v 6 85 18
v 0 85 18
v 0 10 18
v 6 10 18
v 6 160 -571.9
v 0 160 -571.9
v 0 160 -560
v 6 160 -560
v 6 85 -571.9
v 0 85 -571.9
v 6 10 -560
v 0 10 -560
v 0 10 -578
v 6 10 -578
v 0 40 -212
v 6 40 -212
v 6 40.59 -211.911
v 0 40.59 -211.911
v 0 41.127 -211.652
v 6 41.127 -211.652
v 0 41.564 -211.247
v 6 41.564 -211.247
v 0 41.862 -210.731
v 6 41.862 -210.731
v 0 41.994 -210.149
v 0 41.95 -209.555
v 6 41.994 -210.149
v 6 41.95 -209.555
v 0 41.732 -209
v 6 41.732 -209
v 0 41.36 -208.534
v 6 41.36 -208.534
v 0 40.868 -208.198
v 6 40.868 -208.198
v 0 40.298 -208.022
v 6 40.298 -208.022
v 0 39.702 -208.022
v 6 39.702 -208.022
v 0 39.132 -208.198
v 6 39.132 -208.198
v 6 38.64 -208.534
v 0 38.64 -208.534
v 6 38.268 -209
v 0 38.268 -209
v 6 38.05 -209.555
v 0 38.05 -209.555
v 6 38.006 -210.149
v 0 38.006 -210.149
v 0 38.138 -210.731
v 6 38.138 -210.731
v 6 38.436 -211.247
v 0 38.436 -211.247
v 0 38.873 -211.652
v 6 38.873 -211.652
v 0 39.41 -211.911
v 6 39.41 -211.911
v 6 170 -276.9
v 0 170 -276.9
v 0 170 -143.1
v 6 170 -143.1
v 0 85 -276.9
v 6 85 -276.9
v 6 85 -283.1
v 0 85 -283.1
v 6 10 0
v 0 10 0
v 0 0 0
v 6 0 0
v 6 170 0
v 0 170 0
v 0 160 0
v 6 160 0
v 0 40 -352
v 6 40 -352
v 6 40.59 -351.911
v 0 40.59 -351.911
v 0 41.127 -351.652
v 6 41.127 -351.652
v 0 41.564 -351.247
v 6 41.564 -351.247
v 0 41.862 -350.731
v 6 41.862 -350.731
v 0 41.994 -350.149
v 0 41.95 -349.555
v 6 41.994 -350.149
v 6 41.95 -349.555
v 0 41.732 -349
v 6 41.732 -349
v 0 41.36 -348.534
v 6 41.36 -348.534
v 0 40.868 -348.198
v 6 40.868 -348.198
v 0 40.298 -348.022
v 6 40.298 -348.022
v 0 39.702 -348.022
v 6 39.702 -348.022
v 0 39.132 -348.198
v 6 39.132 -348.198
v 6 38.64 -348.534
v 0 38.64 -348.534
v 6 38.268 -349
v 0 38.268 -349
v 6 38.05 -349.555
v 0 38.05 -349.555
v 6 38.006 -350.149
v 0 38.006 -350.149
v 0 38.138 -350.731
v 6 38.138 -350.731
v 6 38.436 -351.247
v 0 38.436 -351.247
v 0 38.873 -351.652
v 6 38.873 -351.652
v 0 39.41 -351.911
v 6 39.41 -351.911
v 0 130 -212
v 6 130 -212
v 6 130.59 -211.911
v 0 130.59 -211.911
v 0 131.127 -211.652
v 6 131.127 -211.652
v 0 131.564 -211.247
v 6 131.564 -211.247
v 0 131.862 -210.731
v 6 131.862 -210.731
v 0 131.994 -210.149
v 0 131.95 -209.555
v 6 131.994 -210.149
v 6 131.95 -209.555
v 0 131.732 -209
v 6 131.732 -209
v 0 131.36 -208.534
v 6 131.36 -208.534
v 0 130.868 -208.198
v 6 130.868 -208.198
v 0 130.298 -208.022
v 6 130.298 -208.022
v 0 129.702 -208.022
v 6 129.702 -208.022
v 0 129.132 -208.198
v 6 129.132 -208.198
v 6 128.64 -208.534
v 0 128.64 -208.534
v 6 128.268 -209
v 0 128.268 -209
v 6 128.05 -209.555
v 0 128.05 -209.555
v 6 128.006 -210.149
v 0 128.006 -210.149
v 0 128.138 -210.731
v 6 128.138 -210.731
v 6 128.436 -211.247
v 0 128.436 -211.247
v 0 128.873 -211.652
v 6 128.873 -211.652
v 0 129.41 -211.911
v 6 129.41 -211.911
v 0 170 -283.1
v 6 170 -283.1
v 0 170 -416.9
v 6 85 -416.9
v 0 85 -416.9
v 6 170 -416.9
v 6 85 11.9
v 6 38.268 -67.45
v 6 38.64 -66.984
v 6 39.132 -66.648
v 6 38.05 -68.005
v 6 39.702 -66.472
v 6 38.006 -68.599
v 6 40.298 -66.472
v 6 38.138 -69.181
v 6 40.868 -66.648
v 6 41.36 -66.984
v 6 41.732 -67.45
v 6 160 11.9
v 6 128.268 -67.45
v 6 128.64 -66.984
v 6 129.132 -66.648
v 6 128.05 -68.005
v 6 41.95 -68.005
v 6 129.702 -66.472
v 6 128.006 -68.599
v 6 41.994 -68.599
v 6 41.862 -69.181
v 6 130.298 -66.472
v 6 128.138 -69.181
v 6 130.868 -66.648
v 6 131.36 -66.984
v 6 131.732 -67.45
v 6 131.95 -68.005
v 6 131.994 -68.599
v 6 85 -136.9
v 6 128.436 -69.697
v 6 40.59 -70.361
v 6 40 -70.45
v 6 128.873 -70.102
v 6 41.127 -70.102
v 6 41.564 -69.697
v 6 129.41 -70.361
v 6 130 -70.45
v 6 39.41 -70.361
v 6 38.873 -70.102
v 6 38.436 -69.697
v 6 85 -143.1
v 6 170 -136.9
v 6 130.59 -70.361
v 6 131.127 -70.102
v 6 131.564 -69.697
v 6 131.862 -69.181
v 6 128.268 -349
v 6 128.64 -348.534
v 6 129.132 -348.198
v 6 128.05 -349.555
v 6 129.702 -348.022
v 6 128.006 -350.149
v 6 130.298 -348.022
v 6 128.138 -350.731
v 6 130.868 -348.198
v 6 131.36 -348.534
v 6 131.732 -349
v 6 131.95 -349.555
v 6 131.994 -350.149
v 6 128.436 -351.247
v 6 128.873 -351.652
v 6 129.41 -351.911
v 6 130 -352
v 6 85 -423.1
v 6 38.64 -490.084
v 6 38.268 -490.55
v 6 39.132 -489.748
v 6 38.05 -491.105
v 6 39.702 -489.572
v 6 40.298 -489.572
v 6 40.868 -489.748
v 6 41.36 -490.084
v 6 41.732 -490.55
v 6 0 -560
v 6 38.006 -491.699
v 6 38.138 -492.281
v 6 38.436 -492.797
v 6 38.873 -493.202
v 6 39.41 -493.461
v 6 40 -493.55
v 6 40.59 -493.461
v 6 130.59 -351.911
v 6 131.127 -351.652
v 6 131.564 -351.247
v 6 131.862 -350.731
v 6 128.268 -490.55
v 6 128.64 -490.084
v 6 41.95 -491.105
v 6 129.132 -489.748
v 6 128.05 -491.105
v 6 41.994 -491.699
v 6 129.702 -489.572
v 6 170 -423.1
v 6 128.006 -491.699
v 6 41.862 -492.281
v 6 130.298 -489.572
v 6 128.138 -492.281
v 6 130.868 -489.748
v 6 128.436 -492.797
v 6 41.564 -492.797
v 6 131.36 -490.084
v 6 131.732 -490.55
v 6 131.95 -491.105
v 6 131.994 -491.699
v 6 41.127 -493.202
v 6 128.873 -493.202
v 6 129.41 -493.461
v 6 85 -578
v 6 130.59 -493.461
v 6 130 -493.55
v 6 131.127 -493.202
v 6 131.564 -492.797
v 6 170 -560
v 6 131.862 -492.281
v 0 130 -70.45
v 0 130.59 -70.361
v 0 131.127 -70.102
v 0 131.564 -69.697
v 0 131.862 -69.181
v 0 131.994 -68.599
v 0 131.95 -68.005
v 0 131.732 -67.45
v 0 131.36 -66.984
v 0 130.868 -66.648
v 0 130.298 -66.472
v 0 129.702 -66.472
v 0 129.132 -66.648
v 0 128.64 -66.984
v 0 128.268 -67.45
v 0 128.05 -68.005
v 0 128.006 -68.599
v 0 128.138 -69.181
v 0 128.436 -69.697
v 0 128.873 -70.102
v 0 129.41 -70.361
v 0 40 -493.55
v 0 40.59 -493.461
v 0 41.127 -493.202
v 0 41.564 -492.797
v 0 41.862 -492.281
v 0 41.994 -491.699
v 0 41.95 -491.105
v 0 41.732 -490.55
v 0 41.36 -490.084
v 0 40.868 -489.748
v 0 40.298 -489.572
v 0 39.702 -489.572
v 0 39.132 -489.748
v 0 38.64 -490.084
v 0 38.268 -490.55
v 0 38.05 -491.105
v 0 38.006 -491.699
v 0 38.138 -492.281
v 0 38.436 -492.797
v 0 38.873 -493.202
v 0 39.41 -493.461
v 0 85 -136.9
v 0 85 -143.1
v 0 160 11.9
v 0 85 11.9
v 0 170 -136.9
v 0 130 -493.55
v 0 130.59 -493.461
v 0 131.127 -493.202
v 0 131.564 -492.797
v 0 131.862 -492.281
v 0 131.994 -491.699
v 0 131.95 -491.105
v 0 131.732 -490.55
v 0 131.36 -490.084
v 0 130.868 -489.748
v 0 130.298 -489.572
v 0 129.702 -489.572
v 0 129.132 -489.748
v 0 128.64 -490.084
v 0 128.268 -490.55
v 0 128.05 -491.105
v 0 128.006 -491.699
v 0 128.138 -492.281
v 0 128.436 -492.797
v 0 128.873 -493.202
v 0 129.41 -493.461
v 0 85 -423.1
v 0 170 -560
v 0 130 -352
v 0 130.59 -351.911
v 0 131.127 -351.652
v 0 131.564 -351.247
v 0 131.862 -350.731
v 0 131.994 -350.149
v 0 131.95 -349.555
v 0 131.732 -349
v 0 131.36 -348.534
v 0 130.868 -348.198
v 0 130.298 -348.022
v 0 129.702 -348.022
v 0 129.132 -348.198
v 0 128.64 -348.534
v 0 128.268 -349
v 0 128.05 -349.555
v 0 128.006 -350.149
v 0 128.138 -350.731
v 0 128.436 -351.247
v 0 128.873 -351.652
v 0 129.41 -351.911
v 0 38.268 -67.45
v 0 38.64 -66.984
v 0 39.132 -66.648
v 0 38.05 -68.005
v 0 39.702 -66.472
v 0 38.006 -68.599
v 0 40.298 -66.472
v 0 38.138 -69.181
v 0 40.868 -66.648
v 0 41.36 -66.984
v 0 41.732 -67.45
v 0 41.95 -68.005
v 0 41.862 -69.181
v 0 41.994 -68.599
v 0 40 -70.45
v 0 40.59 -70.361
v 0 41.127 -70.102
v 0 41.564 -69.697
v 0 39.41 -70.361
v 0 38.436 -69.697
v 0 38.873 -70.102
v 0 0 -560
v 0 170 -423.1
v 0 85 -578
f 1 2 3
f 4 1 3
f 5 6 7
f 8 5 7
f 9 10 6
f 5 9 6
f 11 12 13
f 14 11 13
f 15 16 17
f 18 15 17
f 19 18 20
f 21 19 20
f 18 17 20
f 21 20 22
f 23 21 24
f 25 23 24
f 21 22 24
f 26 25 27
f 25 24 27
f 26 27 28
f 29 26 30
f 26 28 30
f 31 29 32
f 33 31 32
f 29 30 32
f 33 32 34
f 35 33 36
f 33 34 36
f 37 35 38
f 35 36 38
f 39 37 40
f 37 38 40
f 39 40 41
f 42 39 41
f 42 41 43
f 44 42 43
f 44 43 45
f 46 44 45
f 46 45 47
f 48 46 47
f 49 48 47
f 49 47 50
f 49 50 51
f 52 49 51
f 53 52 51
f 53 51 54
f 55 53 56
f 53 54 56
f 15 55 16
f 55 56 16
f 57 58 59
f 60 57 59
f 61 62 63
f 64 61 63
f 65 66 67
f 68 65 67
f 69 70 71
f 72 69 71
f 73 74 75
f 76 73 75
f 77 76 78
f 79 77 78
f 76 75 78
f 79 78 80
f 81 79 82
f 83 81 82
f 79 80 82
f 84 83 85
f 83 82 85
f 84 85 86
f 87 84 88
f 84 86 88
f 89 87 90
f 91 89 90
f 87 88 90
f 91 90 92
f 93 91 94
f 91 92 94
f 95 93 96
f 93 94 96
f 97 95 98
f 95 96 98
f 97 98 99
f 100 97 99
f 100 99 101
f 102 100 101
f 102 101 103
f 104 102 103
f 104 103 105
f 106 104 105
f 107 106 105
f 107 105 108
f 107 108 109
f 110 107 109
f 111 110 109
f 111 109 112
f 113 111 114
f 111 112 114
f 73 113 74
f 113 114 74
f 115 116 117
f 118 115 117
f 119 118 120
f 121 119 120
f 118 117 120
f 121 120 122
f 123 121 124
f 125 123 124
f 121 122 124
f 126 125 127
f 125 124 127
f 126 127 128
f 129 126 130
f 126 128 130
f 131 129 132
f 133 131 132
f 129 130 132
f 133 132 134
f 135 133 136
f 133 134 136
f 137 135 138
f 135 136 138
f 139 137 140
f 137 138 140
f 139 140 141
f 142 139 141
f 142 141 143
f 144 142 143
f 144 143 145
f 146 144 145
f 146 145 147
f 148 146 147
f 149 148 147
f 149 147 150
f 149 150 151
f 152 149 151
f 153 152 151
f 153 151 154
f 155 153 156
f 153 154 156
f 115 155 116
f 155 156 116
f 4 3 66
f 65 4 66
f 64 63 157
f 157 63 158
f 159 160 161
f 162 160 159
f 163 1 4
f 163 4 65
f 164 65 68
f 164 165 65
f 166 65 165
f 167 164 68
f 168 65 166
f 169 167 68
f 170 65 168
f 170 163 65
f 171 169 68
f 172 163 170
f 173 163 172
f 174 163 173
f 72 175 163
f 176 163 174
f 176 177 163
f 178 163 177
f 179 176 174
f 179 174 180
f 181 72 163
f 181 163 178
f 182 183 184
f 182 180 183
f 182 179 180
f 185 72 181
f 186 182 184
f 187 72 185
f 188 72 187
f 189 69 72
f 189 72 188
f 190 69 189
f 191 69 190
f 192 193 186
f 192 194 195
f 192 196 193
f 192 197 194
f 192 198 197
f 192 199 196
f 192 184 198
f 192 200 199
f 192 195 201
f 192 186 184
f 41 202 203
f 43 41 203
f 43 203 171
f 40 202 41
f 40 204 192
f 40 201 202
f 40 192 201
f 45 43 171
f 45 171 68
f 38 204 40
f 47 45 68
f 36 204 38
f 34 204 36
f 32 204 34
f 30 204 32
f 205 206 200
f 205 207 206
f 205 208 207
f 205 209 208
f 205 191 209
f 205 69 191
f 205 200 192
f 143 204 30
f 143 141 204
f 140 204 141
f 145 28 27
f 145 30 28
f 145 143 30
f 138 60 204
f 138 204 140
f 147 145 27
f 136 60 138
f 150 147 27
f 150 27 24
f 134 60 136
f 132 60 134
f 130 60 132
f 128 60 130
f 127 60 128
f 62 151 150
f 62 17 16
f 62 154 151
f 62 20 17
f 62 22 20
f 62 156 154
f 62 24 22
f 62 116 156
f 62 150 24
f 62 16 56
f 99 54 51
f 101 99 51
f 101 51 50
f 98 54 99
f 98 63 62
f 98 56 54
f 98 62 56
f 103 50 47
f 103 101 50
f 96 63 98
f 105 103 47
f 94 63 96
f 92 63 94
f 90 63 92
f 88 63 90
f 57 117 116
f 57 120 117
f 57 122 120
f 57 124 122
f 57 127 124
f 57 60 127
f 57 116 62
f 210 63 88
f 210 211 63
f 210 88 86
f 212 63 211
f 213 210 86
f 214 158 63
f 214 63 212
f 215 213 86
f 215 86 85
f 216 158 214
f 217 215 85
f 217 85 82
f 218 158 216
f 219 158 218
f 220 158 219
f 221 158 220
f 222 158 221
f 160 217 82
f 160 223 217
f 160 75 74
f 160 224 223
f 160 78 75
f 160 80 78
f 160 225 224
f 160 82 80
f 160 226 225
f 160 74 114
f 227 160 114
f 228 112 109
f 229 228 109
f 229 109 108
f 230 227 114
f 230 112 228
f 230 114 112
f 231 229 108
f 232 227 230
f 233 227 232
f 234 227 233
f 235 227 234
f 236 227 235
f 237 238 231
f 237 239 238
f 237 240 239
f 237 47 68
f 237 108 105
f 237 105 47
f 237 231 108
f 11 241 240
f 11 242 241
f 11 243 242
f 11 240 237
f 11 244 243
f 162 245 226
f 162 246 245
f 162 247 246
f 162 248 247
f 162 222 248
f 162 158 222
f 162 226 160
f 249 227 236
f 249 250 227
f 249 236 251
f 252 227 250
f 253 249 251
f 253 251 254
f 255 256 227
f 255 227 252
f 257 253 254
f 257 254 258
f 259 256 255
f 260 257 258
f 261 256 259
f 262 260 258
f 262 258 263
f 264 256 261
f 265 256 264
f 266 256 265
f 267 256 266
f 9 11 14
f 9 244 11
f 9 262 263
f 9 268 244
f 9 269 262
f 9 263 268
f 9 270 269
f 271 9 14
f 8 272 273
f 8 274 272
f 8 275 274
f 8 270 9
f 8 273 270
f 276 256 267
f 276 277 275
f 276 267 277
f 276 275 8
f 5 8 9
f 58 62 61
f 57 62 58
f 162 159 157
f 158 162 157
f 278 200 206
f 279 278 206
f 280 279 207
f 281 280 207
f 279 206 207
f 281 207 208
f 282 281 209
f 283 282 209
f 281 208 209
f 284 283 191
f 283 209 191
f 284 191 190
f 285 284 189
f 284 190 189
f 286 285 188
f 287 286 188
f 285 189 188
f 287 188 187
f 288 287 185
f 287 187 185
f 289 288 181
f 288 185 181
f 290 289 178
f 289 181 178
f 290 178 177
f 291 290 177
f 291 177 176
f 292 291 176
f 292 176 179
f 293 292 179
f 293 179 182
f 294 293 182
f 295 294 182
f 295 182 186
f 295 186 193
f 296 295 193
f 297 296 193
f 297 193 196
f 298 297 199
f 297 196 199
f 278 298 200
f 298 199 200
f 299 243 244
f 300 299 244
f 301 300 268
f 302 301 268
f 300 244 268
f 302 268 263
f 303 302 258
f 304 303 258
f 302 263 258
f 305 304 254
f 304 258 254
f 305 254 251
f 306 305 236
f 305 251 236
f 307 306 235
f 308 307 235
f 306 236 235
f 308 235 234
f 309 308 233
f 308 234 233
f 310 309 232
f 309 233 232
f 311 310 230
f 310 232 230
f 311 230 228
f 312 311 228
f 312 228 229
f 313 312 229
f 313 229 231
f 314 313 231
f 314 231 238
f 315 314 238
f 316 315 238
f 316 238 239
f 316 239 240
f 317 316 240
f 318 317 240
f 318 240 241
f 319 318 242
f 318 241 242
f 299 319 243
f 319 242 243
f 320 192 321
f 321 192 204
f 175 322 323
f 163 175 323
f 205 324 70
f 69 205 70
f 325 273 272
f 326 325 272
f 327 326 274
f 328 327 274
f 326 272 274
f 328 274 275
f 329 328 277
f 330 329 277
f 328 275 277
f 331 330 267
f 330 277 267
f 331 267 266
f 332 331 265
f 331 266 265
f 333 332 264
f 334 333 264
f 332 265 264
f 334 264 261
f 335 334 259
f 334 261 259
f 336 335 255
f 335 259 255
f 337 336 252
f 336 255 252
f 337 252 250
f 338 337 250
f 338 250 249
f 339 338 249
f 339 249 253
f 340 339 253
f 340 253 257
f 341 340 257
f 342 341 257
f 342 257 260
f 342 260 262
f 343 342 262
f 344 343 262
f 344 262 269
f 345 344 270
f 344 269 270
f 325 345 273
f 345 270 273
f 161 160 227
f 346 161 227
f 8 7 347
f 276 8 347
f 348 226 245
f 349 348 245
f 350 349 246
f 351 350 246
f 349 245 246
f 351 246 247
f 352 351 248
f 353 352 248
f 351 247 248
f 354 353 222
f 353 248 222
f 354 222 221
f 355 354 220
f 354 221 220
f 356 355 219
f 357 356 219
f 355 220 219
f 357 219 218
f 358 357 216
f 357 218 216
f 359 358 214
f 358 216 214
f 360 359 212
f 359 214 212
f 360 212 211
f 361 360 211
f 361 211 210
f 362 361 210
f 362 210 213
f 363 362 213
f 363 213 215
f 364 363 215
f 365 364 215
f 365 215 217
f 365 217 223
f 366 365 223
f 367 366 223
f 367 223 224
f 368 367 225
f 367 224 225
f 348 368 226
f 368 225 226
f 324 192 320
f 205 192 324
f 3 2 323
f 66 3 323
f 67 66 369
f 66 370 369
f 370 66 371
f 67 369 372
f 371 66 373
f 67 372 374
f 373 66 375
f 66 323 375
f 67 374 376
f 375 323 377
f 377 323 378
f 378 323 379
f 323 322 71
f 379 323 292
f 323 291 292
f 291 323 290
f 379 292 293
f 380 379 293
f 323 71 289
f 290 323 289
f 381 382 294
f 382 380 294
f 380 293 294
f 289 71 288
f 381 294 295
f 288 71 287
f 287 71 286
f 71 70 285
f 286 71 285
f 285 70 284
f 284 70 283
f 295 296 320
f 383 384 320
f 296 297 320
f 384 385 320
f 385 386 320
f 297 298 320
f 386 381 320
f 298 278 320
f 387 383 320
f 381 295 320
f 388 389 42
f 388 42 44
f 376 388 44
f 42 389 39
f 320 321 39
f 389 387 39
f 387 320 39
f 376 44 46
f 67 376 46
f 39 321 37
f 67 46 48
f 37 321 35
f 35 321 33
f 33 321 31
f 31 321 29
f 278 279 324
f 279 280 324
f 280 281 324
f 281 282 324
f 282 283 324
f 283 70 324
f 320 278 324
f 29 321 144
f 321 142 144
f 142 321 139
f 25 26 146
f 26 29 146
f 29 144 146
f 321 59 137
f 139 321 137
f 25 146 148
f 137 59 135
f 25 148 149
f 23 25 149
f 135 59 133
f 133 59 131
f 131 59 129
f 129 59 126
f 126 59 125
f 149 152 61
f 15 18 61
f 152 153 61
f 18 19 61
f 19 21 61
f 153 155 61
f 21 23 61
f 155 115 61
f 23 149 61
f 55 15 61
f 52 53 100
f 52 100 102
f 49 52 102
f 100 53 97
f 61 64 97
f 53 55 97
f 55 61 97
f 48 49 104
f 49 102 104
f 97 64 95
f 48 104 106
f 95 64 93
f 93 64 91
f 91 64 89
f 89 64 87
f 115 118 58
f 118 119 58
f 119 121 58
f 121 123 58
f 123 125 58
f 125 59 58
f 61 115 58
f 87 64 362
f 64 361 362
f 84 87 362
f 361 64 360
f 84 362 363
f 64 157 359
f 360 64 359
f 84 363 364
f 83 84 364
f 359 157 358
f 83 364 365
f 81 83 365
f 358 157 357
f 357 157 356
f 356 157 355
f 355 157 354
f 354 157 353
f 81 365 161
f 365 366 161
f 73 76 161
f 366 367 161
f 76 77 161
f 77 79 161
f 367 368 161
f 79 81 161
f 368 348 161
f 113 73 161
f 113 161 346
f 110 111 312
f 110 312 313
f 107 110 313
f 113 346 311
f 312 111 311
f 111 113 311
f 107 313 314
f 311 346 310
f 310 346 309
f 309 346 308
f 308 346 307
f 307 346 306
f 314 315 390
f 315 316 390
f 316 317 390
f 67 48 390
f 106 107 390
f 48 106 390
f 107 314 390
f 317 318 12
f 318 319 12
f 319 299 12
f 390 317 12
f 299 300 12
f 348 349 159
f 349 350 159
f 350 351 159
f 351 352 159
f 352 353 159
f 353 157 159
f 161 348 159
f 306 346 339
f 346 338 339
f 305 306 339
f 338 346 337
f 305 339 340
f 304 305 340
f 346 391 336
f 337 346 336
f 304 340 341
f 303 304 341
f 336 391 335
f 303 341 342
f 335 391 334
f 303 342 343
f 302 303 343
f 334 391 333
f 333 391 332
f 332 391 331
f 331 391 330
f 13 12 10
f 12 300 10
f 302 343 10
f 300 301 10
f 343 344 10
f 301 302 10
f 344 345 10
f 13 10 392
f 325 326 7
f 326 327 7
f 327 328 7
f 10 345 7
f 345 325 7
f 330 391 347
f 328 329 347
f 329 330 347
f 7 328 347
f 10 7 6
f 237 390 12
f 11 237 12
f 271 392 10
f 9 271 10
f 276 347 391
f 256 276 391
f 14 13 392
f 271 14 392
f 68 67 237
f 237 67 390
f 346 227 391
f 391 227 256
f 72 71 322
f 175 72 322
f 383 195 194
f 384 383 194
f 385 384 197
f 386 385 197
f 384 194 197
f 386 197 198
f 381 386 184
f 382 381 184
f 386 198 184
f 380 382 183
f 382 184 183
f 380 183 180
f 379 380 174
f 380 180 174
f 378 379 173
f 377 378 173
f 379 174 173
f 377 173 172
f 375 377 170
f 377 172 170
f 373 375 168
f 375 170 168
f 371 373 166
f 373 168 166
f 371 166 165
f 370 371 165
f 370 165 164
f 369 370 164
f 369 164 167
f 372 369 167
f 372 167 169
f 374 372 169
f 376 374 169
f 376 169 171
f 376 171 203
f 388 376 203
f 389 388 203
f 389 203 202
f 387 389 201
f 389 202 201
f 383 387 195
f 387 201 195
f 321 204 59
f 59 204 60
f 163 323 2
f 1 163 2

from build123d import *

# Parameters (mm, degrees)
BOSS_EXTRUDE1_DEPTH = 6
SKETCH2_W           = 6.2
SKETCH2_H           = 85
CUT_EXTRUDE1_DEPTH  = 6
SKETCH3_R           = 2
CUT_EXTRUDE2_DEPTH  = 6


with BuildPart() as part:
    # Sketch1 → Boss-Extrude1 (new body)
    with BuildSketch(Plane(origin=(0, 0, 0), x_dir=(0, 0, -1), z_dir=(1, 0, 0))):
        Polygon((0, 0), (560, 0), (560, 10), (578, 10), (578, 85), (571.9, 85), (571.9, 160), (560, 160), (560, 170), (0, 170), (0, 160), (-11.9, 160), (-11.9, 85), (-18, 85), (-18, 10), (0, 10), align=None)
    extrude(amount=BOSS_EXTRUDE1_DEPTH)

    # Sketch2 → Cut-Extrude1 (cut)
    with BuildSketch(Plane(origin=(6, 0, 0), x_dir=(0, 0, -1), z_dir=(1, 0, 0))):
        with Locations((140, 127.5)):
            Rectangle(SKETCH2_W, SKETCH2_H)
        with Locations((280, 127.5)):
            Rectangle(SKETCH2_W, SKETCH2_H)
        with Locations((420, 127.5)):
            Rectangle(SKETCH2_W, SKETCH2_H)
    extrude(amount=-CUT_EXTRUDE1_DEPTH, mode=Mode.SUBTRACT)

    # Sketch3 → Cut-Extrude2 (cut)
    with BuildSketch(Plane(origin=(6, 0, 0), x_dir=(0, 0, -1), z_dir=(1, 0, 0))):
        with Locations((68.45, 130)):
            Circle(SKETCH3_R)
        with Locations((68.45, 40)):
            Circle(SKETCH3_R)
        with Locations((210, 130)):
            Circle(SKETCH3_R)
        with Locations((210, 40)):
            Circle(SKETCH3_R)
        with Locations((350, 130)):
            Circle(SKETCH3_R)
        with Locations((350, 40)):
            Circle(SKETCH3_R)
        with Locations((491.55, 130)):
            Circle(SKETCH3_R)
        with Locations((491.55, 40)):
            Circle(SKETCH3_R)
    extrude(amount=-CUT_EXTRUDE2_DEPTH, mode=Mode.SUBTRACT)


solid = part.part
